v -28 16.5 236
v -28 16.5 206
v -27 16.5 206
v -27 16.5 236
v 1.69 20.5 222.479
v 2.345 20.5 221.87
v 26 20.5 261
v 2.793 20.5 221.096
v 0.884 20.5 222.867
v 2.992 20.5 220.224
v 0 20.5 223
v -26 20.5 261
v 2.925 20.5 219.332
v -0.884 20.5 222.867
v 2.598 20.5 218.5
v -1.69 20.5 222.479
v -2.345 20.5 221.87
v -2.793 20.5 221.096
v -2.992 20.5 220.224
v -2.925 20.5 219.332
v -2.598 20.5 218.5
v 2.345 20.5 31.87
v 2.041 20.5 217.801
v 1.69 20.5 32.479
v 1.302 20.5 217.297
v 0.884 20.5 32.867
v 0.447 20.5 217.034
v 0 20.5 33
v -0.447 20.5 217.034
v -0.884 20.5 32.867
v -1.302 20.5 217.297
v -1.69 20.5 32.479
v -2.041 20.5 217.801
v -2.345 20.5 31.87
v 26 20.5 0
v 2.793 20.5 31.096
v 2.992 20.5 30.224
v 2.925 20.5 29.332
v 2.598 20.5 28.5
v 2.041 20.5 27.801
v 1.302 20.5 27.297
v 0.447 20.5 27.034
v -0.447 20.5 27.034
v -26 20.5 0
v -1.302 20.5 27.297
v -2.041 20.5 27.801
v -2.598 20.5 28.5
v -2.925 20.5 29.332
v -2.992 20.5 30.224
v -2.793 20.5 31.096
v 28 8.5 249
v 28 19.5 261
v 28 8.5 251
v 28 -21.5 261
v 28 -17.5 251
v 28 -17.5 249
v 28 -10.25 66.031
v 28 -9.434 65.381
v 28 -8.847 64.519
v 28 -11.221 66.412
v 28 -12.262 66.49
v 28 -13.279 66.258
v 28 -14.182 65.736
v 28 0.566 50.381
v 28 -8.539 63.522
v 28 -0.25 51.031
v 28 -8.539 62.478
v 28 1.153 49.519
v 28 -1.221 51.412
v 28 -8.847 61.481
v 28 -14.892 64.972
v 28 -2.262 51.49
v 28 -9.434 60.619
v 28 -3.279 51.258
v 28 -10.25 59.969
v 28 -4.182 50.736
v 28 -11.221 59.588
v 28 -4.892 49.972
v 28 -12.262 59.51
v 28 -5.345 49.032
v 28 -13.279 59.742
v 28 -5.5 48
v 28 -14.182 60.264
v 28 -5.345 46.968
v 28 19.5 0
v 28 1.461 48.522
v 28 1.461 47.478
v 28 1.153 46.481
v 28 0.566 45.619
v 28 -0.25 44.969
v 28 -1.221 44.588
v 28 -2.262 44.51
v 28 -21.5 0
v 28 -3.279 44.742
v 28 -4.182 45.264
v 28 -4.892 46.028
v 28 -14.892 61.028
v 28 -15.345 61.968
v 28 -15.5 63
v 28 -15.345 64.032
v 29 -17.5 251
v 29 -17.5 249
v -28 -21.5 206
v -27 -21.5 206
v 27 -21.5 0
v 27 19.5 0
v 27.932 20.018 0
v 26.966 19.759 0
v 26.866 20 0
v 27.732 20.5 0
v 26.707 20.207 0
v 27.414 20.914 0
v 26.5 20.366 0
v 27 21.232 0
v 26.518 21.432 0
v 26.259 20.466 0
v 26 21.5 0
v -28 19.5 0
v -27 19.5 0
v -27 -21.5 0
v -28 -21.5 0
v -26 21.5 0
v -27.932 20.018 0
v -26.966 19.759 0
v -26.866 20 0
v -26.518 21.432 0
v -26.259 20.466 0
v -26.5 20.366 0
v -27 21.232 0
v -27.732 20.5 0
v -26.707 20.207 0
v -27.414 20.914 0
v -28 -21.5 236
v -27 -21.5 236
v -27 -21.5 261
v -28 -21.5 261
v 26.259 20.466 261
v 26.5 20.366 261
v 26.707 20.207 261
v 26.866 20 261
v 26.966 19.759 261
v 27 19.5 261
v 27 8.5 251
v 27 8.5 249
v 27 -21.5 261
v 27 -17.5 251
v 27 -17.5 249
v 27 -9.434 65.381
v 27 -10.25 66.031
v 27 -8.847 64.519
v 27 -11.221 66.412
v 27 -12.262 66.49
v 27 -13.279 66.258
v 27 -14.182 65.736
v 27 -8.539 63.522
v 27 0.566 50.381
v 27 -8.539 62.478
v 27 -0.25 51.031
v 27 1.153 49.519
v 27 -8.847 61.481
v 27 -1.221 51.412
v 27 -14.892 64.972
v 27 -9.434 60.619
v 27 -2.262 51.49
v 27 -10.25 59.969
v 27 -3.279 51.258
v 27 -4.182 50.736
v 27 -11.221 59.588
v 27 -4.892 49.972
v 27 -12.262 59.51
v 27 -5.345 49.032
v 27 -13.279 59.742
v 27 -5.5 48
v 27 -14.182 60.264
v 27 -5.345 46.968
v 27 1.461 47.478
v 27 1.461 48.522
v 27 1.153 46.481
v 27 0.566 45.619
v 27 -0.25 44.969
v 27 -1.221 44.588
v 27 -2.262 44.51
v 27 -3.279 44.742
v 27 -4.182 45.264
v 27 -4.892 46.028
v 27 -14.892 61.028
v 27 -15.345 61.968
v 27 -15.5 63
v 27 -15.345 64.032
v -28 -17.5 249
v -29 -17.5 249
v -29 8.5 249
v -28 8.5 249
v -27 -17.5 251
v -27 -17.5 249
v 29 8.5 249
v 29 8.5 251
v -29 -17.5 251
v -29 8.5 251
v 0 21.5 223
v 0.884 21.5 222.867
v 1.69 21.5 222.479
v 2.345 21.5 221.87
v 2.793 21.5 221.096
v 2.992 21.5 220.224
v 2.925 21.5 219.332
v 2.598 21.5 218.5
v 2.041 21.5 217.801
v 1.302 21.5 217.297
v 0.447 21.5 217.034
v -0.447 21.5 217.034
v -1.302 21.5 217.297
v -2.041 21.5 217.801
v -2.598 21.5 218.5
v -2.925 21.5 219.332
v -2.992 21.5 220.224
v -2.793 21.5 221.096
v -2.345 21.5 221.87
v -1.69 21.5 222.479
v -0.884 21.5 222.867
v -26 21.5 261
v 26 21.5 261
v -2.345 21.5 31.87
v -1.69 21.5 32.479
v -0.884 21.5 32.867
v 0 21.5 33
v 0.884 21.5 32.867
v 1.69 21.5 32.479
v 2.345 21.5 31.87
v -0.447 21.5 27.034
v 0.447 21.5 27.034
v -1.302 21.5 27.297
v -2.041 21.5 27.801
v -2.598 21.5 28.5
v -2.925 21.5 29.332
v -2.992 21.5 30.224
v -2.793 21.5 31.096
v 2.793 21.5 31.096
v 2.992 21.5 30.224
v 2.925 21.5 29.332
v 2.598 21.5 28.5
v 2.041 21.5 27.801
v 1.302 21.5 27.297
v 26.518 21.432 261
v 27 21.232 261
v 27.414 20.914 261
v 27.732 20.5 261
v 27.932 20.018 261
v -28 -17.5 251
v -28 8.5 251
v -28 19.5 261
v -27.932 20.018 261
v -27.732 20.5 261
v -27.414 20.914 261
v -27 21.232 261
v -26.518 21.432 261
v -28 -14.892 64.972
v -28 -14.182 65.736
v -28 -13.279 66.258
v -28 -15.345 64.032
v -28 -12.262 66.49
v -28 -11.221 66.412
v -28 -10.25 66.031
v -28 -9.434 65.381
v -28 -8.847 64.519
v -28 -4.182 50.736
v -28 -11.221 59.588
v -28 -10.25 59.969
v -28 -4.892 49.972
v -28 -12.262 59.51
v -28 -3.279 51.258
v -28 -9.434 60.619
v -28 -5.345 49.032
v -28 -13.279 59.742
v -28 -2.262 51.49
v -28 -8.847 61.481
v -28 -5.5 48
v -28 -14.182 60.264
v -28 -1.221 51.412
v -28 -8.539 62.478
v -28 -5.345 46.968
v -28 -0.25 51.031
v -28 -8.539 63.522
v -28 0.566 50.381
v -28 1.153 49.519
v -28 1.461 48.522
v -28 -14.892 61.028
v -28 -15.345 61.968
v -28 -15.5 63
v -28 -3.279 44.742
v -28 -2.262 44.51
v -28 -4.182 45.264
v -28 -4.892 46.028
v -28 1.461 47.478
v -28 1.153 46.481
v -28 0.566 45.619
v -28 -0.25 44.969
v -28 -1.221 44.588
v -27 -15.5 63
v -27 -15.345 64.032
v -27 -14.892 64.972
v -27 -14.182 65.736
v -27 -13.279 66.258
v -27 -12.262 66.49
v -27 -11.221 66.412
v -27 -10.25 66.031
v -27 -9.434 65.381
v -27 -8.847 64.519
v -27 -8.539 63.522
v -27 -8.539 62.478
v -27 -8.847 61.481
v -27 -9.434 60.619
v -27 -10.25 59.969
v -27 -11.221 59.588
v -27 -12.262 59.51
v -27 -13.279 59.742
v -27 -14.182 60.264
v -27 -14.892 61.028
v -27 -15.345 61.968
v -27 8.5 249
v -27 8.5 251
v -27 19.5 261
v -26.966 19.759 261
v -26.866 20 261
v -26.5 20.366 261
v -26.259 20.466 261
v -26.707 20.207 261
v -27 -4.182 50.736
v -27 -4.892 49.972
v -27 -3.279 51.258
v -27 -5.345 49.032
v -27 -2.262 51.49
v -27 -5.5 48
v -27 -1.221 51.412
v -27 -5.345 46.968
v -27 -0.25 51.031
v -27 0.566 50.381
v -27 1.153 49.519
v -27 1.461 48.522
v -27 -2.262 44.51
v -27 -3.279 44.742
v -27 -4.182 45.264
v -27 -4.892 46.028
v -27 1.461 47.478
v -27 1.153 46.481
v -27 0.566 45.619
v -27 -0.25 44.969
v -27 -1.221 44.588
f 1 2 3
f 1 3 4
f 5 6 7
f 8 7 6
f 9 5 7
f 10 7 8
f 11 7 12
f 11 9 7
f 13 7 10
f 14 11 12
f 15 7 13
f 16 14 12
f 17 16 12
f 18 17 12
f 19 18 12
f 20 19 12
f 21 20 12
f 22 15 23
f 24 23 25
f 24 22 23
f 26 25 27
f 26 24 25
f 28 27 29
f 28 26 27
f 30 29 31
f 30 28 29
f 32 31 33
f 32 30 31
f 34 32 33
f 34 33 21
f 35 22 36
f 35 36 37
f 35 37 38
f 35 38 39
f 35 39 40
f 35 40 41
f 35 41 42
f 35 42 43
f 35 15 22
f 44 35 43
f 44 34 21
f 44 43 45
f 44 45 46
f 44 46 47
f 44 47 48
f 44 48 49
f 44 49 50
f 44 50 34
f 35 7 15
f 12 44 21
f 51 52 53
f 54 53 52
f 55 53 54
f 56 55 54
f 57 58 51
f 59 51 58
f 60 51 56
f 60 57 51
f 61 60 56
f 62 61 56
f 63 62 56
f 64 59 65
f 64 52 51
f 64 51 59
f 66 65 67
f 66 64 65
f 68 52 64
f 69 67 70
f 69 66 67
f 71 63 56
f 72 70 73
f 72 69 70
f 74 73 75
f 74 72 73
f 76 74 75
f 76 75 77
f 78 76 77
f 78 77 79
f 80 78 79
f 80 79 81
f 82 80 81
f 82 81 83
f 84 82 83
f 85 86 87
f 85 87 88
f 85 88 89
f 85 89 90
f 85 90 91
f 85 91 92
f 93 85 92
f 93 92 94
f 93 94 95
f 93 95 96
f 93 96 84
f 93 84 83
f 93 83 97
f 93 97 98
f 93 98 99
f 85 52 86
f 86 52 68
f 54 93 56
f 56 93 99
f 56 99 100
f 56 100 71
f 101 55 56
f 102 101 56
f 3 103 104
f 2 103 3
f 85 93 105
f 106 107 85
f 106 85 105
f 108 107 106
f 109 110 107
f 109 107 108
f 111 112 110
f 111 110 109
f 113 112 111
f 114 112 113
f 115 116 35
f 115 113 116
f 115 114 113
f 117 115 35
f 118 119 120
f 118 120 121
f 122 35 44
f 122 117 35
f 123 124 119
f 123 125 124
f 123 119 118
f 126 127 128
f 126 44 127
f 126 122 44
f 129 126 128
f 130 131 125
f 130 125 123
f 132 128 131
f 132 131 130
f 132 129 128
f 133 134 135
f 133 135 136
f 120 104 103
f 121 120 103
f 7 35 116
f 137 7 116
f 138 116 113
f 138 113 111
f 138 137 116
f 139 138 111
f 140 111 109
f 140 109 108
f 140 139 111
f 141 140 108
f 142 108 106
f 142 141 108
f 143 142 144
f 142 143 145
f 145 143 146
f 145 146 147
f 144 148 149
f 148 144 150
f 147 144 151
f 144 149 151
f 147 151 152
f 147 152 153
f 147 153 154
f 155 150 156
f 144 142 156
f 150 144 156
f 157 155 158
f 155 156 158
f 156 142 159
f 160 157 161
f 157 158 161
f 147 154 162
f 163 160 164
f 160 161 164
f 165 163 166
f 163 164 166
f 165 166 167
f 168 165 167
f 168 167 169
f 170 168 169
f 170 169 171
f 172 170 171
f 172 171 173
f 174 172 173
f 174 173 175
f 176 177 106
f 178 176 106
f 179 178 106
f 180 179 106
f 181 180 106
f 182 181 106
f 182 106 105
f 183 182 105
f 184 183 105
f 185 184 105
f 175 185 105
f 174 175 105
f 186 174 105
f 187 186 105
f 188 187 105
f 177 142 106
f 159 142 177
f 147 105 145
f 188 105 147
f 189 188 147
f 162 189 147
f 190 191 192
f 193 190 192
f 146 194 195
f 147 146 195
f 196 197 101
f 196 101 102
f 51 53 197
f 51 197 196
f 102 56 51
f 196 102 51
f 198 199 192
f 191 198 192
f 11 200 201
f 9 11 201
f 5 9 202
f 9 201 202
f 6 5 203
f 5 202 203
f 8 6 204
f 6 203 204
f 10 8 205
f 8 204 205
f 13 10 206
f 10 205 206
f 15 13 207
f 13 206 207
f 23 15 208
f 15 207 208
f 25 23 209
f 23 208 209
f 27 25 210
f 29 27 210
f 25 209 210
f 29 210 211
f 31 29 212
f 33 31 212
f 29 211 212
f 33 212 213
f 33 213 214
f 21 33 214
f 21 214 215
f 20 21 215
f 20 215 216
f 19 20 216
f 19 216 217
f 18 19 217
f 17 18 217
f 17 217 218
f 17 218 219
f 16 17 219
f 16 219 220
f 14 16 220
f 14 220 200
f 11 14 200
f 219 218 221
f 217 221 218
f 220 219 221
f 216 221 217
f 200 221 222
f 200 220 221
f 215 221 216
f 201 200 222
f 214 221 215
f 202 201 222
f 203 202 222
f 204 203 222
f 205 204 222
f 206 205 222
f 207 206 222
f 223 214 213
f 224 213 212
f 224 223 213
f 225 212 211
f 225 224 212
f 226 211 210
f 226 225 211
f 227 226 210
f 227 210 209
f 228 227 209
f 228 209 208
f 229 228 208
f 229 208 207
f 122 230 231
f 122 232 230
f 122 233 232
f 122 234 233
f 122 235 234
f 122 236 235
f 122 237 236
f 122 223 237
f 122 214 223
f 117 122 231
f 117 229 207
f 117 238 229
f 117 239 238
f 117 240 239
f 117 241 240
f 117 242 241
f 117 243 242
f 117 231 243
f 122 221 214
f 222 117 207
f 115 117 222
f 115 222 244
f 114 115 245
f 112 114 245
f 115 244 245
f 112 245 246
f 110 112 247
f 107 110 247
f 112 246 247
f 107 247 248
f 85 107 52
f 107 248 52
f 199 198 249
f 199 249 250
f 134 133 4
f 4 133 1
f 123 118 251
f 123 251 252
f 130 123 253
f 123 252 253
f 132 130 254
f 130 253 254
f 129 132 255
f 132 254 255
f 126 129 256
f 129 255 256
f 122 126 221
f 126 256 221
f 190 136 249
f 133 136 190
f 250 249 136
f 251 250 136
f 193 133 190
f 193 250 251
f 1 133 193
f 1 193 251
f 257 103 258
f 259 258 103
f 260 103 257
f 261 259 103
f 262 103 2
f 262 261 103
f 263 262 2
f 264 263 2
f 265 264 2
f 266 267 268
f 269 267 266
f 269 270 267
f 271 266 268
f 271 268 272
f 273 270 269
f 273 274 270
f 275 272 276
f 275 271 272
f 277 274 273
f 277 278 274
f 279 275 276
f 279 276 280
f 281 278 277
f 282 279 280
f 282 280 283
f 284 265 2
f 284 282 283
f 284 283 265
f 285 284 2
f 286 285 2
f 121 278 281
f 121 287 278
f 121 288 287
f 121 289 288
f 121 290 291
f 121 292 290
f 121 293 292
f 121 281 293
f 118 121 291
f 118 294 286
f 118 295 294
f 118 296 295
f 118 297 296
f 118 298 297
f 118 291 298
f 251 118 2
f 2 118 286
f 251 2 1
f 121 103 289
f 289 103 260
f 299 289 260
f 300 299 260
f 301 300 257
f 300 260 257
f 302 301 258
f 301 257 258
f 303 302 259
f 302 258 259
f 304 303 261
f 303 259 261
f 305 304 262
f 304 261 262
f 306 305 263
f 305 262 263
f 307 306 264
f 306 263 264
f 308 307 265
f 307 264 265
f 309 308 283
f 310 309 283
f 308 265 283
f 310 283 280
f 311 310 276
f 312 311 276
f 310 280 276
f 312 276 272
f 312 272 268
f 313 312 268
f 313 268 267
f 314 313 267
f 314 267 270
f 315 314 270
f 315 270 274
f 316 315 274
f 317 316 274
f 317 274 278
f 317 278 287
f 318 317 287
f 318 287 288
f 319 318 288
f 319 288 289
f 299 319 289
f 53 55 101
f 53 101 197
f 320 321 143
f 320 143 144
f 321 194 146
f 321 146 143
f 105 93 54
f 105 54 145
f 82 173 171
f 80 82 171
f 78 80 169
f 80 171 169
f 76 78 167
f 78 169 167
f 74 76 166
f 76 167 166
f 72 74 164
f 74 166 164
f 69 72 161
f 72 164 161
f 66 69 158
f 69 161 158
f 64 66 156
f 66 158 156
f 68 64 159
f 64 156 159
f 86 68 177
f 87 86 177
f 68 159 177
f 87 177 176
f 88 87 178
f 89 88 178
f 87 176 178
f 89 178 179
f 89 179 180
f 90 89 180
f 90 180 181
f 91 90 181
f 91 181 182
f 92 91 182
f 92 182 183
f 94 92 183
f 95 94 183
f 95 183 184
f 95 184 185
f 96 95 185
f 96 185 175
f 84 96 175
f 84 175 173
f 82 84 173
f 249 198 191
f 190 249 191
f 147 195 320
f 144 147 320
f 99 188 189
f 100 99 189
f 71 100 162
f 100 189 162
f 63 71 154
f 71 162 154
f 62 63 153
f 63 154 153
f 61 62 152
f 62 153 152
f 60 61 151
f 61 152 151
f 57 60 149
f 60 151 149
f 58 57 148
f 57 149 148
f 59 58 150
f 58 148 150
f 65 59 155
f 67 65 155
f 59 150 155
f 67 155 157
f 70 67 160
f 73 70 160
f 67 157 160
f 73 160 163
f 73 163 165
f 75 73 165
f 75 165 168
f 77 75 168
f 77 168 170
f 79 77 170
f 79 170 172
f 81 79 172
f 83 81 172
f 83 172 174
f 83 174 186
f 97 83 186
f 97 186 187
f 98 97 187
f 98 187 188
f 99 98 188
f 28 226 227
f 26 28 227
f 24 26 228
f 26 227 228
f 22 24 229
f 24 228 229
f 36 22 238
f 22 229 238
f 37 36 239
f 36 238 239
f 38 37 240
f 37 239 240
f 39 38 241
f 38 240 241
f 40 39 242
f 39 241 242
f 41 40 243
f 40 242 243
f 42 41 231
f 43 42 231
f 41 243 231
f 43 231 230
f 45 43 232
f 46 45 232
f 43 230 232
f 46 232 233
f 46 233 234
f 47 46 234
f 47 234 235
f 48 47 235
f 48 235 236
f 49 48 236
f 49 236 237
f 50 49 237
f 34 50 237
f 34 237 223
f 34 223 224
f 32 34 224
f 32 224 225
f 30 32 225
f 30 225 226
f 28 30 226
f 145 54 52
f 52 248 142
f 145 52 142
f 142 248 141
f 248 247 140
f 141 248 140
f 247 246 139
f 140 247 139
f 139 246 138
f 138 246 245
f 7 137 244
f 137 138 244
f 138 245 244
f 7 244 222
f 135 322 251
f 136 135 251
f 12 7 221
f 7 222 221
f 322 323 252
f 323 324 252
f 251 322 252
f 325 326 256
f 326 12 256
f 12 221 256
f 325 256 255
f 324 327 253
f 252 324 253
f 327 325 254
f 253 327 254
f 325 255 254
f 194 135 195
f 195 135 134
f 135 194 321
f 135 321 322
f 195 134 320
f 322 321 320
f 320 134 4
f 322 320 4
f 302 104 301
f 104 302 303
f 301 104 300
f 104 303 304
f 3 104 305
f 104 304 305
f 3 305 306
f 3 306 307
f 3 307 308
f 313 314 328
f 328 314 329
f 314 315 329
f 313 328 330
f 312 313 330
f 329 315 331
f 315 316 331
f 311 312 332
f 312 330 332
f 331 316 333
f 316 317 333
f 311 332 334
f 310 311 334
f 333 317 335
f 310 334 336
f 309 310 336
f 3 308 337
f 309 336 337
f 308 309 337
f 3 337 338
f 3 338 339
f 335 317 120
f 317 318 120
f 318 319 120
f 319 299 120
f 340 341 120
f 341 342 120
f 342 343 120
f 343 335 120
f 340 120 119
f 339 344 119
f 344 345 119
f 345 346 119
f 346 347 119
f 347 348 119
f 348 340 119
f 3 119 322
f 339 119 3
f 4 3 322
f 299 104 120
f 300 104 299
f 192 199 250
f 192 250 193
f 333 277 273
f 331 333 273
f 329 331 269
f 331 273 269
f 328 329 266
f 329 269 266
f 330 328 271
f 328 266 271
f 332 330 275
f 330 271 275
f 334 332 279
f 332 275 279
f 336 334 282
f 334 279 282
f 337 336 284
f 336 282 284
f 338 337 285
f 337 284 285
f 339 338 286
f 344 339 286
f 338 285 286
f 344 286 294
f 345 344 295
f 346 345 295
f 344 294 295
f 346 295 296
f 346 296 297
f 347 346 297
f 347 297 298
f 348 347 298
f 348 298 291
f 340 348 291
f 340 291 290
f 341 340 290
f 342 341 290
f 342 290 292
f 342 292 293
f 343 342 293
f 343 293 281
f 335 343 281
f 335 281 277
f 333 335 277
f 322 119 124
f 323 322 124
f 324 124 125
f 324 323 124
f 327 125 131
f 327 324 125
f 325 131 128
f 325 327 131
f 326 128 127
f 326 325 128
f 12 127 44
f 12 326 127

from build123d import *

# Parameters (mm, degrees)
BOSS_EXTRUDE1_DEPTH      = 261
FILLET1_R                = 2
FILLET2_R                = 1
BOSS_EXTRUDE2_DEPTH      = 56
BOSS_EXTRUDE2_DEPTH_BACK = 2
SKETCH2_W                = 2
SKETCH2_H                = 26
SKETCH3_R                = 3
CUT_EXTRUDE1_DEPTH       = 11
SKETCH4_W                = 30
SKETCH4_H                = 40
CUT_EXTRUDE2_DEPTH       = 10
SKETCH5_R                = 3.5
CUT_EXTRUDE3_DEPTH       = 69


with BuildPart() as part:
    # Sketch1 → Boss-Extrude1 (new body)
    with BuildSketch(Plane.XY):
        Polygon((27, -21.5), (27, -20.5), (27, 20.5), (-27, 20.5), (-27, -20.5), (-27, -21.5), (-28, -21.5), (-28, 21.5), (28, 21.5), (28, -21.5), align=None)
    extrude(amount=BOSS_EXTRUDE1_DEPTH)

    # Fillet1
    fillet1_edges = [part.edges().sort_by_distance(p)[0] for p in [
        (-28, 21.5, 130.5),
        (28, 21.5, 130.5),
    ]]
    fillet(fillet1_edges, radius=FILLET1_R)

    # Fillet2
    fillet2_edges = [part.edges().sort_by_distance(p)[0] for p in [
        (27, 20.5, 130.5),
        (-27, 20.5, 130.5),
    ]]
    fillet(fillet2_edges, radius=FILLET2_R)

    # Sketch2 → Boss-Extrude2 (add, two sides: drawn at the far end of the back side and taken through both)
    with BuildSketch(Plane(origin=(-27, 0, 0), x_dir=(0, 0, -1), z_dir=(1, 0, 0)).offset(-BOSS_EXTRUDE2_DEPTH_BACK)):
        with Locations((-250, -4.5)):
            Rectangle(SKETCH2_W, SKETCH2_H)
    extrude(amount=BOSS_EXTRUDE2_DEPTH + BOSS_EXTRUDE2_DEPTH_BACK)

    # Sketch3 → Cut-Extrude1 (cut)
    with BuildSketch(Plane(origin=(0, 21.5, 0), x_dir=(1, 0, 0), z_dir=(0, 1, 0))):
        with Locations(Location((0, -30, 0), (0, 0, 270))):
            Circle(SKETCH3_R)
        with Locations(Location((0, -220, 0), (0, 0, 270))):
            Circle(SKETCH3_R)
    extrude(amount=-CUT_EXTRUDE1_DEPTH, mode=Mode.SUBTRACT)

    # Sketch4 → Cut-Extrude2 (cut)
    with BuildSketch(Plane.ZY.offset(28)):
        with Locations((221, -3.5)):
            Rectangle(SKETCH4_W, SKETCH4_H)
    extrude(amount=-CUT_EXTRUDE2_DEPTH, mode=Mode.SUBTRACT)

    # Sketch5 → Cut-Extrude3 (cut)
    with BuildSketch(Plane.ZY.offset(28)):
        with Locations(Location((48, -2, 0), (0, 0, 270))):
            Circle(SKETCH5_R)
        with Locations(Location((63, -12, 0), (0, 0, 270))):
            Circle(SKETCH5_R)
    extrude(amount=-CUT_EXTRUDE3_DEPTH, mode=Mode.SUBTRACT)


solid = part.part
